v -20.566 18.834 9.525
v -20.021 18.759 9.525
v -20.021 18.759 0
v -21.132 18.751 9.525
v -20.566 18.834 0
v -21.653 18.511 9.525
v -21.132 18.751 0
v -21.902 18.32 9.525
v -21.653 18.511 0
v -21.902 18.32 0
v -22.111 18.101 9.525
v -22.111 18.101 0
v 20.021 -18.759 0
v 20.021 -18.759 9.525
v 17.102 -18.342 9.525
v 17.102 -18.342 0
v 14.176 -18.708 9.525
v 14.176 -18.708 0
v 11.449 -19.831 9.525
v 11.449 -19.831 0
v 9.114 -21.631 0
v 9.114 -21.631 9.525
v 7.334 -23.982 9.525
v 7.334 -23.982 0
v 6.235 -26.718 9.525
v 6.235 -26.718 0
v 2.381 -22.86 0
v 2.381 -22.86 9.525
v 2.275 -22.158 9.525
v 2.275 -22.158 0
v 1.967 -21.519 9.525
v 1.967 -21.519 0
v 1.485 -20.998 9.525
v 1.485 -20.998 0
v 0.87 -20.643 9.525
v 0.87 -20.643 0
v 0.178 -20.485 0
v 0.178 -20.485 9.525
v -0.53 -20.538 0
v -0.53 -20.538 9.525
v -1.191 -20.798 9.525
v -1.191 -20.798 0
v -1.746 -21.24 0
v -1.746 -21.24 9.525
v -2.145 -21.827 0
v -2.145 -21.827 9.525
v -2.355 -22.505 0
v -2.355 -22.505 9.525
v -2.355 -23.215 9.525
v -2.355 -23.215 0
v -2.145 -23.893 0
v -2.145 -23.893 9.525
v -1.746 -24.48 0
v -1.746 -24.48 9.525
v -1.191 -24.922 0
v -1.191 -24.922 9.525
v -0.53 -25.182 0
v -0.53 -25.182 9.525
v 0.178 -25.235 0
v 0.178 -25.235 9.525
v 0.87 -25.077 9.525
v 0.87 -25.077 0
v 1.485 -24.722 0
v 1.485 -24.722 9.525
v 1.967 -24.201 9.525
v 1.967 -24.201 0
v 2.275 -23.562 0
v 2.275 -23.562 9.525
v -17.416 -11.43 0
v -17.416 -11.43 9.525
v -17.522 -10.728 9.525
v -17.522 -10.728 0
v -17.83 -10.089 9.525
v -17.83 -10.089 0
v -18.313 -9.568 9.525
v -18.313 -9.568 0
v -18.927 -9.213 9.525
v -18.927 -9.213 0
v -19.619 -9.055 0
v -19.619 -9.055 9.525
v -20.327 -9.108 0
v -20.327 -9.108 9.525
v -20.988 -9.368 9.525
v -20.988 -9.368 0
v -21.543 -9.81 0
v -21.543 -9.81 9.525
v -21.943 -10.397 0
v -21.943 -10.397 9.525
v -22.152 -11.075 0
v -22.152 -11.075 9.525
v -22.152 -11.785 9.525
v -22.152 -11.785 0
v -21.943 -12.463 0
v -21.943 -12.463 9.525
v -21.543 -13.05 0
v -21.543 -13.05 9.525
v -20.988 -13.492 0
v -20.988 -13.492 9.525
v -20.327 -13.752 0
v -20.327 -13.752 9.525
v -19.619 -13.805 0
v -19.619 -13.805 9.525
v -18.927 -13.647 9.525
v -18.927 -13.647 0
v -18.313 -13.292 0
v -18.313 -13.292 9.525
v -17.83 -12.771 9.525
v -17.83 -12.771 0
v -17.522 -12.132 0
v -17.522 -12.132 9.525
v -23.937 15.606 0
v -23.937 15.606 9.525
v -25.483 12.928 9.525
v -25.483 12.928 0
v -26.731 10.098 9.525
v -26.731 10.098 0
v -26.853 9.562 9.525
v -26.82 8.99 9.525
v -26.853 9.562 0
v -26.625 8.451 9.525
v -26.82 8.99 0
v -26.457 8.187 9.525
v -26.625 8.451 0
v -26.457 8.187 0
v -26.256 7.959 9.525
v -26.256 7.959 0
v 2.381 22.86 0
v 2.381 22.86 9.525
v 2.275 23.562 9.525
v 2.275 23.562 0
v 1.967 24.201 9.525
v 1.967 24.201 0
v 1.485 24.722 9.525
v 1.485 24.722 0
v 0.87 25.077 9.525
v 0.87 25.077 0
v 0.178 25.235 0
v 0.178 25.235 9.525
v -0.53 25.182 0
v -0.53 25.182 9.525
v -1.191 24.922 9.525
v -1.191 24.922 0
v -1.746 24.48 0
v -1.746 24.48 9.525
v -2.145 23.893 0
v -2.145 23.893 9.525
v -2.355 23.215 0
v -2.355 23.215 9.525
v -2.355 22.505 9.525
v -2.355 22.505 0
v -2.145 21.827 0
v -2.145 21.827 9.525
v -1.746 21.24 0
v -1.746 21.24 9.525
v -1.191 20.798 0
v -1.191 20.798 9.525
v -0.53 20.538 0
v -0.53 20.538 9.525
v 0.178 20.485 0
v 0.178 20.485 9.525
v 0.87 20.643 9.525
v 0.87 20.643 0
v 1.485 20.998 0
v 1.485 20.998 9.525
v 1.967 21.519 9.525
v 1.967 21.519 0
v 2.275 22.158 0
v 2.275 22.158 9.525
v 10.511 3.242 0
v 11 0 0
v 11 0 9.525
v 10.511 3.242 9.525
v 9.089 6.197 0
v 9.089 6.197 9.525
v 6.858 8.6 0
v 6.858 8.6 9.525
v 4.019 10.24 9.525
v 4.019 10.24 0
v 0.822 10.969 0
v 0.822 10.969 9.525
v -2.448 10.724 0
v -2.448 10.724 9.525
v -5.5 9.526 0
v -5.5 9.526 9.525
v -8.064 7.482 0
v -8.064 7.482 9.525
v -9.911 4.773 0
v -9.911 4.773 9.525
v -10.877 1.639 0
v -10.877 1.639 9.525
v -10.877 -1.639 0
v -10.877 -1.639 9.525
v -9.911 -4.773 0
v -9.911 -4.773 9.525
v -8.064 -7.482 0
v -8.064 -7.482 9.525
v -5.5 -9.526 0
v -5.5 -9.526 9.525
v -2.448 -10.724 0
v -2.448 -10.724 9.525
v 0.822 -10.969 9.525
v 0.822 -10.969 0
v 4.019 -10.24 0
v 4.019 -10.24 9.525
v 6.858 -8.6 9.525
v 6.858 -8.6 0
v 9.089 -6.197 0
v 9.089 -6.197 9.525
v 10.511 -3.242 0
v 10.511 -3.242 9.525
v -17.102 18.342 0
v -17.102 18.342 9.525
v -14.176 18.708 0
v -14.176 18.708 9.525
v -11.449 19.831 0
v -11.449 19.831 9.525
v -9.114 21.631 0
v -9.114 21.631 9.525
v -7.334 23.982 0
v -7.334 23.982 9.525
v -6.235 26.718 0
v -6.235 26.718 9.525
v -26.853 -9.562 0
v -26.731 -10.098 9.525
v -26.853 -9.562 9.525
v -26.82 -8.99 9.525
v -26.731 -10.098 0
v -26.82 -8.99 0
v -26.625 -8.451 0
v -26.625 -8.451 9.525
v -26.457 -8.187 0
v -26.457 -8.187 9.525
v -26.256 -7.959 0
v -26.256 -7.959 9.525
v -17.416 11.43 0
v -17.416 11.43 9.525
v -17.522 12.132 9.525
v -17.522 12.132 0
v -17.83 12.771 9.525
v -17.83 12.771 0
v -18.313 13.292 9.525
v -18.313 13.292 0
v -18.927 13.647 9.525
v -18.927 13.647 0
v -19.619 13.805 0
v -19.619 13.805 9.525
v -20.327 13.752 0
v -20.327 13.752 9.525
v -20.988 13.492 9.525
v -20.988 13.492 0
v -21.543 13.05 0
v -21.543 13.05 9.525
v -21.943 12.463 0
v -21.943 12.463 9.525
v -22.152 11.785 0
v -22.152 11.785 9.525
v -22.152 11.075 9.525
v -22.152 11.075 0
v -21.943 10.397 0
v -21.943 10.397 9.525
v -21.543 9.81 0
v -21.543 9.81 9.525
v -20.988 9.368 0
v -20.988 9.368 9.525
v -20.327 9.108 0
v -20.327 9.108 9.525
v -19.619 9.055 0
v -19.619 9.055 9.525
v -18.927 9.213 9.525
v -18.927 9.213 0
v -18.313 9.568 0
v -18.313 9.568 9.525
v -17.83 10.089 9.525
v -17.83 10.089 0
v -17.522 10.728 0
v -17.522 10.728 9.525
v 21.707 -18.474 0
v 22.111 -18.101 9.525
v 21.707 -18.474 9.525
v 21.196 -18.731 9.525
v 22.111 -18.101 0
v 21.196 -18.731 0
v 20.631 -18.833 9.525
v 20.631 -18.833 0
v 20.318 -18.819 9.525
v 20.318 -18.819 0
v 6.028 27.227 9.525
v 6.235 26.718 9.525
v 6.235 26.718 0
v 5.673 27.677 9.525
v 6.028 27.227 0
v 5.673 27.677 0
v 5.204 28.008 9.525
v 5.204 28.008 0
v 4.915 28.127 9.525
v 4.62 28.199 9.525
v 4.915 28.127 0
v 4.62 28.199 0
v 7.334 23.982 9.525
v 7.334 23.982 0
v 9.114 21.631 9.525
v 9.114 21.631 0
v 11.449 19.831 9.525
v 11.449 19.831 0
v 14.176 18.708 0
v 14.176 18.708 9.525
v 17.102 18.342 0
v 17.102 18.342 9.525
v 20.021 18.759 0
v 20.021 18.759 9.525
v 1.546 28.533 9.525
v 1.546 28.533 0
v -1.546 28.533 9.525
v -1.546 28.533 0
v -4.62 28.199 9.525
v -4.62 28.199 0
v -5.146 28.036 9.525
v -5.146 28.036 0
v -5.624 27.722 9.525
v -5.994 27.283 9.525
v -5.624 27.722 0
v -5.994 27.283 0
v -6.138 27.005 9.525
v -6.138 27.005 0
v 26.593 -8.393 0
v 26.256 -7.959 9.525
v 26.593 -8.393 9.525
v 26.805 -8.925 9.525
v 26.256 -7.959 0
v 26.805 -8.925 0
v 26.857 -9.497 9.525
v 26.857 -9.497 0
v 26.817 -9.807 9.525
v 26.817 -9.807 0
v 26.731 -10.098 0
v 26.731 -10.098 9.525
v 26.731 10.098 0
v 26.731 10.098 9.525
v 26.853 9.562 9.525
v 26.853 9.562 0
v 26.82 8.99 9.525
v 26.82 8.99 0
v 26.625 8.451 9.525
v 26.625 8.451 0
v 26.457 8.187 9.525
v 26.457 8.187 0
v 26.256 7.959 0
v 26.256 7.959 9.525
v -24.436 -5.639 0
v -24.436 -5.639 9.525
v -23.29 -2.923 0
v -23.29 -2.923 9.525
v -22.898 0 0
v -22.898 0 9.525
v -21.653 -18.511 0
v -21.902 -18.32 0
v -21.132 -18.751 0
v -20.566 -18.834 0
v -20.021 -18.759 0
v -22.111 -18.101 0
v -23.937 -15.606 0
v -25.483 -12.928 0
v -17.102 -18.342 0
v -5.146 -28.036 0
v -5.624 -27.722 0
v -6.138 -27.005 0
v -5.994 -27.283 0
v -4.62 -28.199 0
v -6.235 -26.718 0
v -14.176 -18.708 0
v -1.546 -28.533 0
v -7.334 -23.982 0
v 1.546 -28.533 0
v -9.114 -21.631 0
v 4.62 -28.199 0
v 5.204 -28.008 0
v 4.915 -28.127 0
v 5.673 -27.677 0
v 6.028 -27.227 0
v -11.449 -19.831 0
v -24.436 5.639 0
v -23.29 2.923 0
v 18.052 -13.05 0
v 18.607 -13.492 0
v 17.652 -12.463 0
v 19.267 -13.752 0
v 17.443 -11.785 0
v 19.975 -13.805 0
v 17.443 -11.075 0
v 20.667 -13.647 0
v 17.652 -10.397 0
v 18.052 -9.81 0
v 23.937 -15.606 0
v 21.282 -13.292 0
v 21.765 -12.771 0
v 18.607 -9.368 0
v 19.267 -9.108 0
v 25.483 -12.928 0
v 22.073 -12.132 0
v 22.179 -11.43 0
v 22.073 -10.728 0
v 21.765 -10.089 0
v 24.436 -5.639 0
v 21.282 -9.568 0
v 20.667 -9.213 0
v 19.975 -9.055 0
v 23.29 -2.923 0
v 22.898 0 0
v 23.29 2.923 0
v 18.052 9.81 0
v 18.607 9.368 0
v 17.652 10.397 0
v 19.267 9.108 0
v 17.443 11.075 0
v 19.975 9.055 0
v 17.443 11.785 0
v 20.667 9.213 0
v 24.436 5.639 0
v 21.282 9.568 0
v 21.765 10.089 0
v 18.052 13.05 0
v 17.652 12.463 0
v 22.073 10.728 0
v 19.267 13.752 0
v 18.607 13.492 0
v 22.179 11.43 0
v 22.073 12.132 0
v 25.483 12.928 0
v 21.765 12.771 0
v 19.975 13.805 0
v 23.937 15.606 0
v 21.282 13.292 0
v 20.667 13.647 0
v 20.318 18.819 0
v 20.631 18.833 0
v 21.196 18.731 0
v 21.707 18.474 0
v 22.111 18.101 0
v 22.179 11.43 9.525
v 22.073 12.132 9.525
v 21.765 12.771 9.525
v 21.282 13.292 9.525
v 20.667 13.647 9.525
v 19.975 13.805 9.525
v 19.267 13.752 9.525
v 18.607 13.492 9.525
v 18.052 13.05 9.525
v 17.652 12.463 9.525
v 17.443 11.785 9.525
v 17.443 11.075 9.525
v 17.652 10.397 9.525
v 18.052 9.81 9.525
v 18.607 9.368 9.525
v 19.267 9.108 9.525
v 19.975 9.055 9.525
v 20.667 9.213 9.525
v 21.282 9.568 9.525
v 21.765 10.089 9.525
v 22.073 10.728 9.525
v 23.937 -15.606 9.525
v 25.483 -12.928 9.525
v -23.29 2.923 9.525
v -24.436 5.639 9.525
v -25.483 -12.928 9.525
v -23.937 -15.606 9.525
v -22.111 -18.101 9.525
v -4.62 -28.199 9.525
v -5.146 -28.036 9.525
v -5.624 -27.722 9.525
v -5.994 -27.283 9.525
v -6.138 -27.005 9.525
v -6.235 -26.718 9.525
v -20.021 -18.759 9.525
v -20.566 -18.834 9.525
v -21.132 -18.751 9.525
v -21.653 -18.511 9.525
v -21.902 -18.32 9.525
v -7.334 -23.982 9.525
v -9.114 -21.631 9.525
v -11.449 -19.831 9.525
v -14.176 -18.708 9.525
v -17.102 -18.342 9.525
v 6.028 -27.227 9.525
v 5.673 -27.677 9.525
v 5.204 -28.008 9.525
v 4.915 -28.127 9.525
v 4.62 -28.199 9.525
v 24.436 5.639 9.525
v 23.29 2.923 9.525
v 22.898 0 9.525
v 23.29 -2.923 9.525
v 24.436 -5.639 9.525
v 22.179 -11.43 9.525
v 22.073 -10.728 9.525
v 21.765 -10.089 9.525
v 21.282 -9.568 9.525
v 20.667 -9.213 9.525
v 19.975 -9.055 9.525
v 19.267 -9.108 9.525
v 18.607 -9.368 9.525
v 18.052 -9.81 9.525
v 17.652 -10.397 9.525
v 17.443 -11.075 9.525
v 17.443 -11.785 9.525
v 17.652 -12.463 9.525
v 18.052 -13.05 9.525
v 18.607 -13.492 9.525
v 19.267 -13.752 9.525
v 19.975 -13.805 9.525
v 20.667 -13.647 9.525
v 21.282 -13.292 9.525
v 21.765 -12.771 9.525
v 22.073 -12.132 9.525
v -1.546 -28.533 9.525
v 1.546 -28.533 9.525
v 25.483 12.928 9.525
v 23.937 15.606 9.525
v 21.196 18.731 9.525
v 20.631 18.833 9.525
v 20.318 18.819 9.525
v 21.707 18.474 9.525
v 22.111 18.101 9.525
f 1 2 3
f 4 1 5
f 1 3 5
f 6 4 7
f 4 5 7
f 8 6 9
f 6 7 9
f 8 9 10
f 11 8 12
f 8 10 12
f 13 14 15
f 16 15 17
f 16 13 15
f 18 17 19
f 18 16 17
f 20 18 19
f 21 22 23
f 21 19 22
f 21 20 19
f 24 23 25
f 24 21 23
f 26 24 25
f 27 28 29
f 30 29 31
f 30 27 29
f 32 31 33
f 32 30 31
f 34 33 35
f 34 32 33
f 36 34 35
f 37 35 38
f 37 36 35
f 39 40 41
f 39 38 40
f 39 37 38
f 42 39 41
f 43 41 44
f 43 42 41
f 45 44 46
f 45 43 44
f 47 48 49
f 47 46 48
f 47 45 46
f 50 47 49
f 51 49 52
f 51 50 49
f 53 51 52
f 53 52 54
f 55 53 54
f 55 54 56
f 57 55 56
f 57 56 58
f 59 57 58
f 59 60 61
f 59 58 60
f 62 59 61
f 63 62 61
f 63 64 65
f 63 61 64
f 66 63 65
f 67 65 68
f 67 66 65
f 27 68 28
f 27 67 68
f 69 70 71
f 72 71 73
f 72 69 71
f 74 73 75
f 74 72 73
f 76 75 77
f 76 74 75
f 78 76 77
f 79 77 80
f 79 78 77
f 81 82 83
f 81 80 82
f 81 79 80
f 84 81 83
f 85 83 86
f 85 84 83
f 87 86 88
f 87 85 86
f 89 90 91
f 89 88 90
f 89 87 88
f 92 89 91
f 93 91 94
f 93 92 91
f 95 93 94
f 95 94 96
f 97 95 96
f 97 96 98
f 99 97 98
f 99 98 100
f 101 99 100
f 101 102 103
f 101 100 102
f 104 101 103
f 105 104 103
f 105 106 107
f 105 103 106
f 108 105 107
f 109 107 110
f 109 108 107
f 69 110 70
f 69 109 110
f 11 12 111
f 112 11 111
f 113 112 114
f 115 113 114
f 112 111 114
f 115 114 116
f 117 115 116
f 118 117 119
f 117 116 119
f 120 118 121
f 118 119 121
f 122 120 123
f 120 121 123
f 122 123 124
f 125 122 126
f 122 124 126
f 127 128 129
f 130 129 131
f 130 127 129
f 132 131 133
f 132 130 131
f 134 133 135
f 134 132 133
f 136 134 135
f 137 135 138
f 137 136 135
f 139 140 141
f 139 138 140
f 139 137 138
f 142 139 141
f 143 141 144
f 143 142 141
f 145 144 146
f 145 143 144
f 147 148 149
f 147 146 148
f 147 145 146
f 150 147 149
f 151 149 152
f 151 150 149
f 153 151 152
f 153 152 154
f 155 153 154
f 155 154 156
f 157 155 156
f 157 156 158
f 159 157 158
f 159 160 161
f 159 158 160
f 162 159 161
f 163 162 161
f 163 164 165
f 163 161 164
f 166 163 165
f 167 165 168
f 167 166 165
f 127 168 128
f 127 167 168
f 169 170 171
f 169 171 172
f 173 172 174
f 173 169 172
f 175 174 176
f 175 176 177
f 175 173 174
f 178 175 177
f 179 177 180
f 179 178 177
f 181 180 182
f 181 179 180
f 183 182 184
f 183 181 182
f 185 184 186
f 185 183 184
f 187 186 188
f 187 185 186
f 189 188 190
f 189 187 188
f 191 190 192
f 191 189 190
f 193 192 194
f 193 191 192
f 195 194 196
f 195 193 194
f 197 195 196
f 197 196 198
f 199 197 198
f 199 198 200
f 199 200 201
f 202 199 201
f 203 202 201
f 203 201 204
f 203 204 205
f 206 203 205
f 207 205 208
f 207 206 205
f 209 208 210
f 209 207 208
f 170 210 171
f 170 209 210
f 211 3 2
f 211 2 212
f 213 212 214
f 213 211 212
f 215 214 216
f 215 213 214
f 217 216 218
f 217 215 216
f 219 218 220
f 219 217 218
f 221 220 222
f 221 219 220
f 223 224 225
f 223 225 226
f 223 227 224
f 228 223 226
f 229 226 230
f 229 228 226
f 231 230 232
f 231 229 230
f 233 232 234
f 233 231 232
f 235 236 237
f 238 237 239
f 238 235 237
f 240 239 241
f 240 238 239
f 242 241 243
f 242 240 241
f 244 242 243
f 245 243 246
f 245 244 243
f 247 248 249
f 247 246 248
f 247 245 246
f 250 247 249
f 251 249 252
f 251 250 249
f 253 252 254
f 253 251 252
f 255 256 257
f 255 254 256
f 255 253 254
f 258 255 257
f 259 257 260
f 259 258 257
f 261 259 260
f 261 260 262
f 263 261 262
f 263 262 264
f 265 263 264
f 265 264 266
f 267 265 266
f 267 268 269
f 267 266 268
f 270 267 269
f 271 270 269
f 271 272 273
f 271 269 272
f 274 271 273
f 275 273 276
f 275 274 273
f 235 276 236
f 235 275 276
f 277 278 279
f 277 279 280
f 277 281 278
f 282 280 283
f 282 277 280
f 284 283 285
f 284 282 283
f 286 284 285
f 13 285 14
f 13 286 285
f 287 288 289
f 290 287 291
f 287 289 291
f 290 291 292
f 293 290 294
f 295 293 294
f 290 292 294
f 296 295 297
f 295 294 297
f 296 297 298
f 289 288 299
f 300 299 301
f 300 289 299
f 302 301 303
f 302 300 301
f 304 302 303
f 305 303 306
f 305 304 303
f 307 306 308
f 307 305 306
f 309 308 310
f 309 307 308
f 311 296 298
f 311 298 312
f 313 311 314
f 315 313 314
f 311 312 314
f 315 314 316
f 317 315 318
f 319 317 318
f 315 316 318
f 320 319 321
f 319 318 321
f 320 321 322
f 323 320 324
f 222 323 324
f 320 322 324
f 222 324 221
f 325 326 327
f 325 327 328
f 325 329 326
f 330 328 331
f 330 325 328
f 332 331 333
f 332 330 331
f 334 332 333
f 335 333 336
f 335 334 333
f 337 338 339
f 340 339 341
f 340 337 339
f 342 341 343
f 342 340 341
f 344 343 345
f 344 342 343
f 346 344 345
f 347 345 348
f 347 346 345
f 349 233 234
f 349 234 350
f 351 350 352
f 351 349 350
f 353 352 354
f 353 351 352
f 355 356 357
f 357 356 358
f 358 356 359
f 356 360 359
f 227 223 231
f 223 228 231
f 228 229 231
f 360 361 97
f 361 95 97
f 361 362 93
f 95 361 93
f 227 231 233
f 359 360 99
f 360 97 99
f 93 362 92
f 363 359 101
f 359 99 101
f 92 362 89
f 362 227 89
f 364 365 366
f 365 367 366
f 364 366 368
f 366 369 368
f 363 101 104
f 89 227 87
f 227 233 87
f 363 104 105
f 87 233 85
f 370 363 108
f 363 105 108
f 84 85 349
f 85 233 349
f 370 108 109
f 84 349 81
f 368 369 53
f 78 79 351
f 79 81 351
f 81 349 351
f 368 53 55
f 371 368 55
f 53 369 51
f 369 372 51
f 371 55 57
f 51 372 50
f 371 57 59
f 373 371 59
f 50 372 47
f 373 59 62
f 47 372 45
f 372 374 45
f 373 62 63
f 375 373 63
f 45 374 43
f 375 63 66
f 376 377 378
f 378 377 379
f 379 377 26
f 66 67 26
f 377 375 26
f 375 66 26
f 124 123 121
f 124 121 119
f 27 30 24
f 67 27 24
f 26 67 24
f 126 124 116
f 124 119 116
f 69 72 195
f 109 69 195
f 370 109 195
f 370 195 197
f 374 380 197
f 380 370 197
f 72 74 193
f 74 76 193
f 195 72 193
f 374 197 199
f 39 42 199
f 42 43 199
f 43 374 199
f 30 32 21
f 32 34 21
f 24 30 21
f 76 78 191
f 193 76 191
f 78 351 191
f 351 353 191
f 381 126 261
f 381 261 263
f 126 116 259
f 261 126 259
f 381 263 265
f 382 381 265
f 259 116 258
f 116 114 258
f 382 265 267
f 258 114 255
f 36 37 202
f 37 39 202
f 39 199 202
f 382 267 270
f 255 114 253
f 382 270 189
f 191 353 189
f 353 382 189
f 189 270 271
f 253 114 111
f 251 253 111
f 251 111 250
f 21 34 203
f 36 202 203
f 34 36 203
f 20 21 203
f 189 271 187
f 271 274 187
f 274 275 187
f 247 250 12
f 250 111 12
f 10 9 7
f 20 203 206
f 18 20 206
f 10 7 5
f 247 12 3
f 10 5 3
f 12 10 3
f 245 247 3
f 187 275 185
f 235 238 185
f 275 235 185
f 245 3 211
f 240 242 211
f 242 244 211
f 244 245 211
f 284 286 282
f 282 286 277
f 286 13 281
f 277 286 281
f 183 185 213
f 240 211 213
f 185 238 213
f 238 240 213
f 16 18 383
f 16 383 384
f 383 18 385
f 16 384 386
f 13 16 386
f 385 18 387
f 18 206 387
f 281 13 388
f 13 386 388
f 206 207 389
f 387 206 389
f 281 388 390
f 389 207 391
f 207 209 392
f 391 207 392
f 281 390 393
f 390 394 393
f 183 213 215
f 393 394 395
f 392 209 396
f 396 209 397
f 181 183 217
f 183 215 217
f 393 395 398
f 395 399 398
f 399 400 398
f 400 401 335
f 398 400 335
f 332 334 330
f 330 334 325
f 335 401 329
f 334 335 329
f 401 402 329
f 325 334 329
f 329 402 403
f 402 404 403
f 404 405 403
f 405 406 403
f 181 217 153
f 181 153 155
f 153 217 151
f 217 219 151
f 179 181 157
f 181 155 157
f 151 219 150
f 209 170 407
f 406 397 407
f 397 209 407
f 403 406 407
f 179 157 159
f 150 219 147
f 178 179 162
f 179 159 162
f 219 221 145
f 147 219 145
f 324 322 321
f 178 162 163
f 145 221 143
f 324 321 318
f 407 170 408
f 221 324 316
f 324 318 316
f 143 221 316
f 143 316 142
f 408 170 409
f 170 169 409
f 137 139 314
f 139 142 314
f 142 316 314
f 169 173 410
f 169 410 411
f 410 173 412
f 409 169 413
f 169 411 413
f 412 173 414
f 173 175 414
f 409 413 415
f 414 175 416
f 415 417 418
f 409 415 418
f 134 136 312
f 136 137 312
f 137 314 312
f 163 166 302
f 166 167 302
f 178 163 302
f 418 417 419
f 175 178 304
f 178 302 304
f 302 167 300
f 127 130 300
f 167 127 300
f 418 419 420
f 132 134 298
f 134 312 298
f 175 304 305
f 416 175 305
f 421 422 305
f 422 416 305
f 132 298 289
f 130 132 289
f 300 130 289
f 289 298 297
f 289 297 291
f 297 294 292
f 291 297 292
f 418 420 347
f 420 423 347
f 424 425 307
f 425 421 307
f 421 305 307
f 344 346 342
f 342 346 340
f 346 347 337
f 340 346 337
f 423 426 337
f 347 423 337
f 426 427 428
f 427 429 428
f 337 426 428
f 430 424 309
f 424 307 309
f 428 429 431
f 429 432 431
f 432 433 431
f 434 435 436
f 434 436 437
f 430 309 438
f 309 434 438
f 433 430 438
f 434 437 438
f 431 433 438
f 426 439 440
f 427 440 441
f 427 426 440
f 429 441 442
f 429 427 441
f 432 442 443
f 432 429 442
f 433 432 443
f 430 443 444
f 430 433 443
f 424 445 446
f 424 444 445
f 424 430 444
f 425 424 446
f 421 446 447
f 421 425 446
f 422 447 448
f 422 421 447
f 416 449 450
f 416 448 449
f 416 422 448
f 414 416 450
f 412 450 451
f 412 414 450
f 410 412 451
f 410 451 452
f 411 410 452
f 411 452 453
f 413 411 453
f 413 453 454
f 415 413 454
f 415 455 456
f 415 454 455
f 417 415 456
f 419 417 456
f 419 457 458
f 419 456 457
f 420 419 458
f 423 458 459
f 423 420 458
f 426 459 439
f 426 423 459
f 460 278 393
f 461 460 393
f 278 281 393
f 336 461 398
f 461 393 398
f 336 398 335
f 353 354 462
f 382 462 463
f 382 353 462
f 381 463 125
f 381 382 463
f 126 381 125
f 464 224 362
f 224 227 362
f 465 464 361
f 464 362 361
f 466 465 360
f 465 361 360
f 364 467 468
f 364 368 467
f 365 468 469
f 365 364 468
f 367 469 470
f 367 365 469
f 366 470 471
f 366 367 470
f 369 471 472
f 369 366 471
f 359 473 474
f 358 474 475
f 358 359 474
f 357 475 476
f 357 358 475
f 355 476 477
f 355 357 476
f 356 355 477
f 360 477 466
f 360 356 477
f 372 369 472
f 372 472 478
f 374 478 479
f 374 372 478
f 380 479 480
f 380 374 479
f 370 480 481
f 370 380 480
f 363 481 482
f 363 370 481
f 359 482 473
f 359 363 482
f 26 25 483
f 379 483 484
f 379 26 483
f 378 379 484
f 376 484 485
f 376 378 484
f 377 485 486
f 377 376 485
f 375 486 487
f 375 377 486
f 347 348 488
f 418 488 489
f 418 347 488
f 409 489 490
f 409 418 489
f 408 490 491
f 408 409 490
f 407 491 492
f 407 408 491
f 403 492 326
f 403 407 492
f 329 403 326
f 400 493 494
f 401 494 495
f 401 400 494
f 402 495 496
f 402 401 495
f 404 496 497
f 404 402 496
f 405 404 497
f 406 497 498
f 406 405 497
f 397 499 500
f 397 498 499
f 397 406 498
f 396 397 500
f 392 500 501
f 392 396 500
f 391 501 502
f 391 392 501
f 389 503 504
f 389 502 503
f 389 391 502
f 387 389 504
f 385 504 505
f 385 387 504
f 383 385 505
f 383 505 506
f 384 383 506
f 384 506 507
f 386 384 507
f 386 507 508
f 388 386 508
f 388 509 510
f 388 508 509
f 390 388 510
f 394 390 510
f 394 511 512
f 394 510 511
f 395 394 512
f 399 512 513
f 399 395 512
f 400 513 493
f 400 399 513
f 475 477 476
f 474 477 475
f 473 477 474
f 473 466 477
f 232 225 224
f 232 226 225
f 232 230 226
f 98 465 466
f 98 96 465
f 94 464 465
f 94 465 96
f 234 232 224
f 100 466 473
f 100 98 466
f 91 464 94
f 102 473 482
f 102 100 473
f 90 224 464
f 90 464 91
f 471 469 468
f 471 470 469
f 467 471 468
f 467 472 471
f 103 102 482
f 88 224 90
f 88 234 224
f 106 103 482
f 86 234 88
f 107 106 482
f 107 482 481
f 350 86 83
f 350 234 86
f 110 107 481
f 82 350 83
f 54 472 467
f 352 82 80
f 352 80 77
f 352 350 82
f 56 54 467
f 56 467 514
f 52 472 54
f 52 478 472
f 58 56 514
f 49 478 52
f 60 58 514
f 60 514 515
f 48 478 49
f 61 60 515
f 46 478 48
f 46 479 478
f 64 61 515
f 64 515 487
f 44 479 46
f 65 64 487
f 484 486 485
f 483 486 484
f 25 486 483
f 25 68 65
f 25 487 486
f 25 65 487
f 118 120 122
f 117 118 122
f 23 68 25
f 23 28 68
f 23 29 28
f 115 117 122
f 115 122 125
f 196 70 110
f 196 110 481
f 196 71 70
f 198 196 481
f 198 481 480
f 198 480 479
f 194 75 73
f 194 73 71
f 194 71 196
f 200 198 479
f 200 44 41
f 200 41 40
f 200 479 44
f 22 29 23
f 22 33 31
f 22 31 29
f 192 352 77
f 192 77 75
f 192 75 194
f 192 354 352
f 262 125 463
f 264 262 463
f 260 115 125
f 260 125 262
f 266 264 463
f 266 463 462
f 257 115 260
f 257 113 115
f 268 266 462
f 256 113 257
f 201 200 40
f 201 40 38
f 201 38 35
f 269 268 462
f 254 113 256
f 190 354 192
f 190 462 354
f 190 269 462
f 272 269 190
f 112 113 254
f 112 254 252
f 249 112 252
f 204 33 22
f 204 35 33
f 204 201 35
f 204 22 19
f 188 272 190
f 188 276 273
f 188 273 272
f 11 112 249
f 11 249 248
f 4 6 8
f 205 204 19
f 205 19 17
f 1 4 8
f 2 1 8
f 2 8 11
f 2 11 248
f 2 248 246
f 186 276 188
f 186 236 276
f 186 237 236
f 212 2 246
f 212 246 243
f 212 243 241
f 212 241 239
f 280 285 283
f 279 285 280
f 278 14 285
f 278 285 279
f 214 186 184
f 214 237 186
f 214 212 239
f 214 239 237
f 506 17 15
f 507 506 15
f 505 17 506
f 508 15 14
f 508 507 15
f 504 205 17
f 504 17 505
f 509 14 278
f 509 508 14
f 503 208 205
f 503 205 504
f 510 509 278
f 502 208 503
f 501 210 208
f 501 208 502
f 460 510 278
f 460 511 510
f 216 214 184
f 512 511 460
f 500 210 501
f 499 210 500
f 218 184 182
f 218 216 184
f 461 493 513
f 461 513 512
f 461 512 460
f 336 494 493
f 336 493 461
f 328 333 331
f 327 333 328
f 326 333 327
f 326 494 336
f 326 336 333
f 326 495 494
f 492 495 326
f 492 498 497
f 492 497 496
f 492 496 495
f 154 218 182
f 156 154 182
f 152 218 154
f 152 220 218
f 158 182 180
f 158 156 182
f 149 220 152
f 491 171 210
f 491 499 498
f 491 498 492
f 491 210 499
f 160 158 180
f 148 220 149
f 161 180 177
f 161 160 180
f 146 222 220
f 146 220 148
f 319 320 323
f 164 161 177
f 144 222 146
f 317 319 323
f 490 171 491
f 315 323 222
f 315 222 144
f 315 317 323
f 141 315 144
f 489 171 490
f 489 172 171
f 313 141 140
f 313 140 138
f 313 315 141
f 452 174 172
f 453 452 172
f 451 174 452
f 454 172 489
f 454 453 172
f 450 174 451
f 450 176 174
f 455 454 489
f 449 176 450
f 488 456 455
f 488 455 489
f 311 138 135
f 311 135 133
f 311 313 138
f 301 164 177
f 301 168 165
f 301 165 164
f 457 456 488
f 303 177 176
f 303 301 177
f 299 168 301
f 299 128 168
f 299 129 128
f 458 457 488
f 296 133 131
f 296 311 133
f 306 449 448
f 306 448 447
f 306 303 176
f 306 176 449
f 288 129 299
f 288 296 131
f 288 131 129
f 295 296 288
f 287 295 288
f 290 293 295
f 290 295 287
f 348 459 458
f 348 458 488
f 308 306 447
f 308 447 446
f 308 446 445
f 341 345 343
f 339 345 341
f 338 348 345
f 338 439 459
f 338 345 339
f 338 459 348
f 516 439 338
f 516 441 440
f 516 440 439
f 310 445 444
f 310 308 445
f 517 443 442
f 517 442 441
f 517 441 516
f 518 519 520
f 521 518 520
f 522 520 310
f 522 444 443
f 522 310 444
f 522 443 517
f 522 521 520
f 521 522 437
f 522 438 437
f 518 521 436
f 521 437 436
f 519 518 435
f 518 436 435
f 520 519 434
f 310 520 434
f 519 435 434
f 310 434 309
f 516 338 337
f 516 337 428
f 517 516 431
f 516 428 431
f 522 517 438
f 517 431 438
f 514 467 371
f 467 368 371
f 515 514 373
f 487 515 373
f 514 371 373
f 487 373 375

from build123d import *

# Parameters (mm, degrees)
F0_R     = 28.575
F0_R_2   = 11
F1_DEPTH = 9.525
F3_DEPTH = 25.4
F4_R     = 2.38125
F5_DEPTH = 25.4
F6_R     = 2


with BuildPart() as f1:
    # F0 (on Top) → F1 (new body)
    with BuildSketch(Plane.XY):
        Circle(F0_R)
        Circle(F0_R_2, mode=Mode.SUBTRACT)
    extrude(amount=F1_DEPTH)

    # F2 (on Top) → F3 (cut)
    with BuildSketch(Plane.XY):
        with BuildLine():
            ThreePointArc((6.6033751745, -33.3637991738), (17.0054966041, -29.4543841262), (25.592210064, -22.4005902387))
            ThreePointArc((25.592210064, -22.4005902387), (11.4492466041, -19.8306768266), (6.6033751745, -33.3637991738))
        make_face()
        with BuildLine():
            ThreePointArc((-25.592210064, -22.4005902387), (-17.0054966041, -29.4543841262), (-6.6033751745, -33.3637991738))
            ThreePointArc((-6.6033751745, -33.3637991738), (-6.0720335059, -31.4411002438), (-5.8929966041, -29.4543841262))
            ThreePointArc((-5.8929966041, -29.4543841262), (-13.259311683, -18.9923692731), (-25.592210064, -22.4005902387))
        make_face()
        with BuildLine():
            ThreePointArc((-22.8984932081, 0), (-25.5356944726, 7.187278177), (-32.1955852385, 10.9632089351))
            ThreePointArc((-32.1955852385, 10.9632089351), (-34.0109932081, 0), (-32.1955852385, -10.9632089351))
            ThreePointArc((-32.1955852385, -10.9632089351), (-25.5356944726, -7.187278177), (-22.8984932081, 0))
        make_face()
        with BuildLine():
            ThreePointArc((-5.8929966041, 29.4543841262), (-6.0720335059, 31.4411002438), (-6.6033751745, 33.3637991738))
            ThreePointArc((-6.6033751745, 33.3637991738), (-17.0054966041, 29.4543841262), (-25.592210064, 22.4005902387))
            ThreePointArc((-25.592210064, 22.4005902387), (-13.259311683, 18.9923692731), (-5.8929966041, 29.4543841262))
        make_face()
        with BuildLine():
            ThreePointArc((6.6033751745, 33.3637991738), (11.4492466041, 19.8306768266), (25.592210064, 22.4005902387))
            ThreePointArc((25.592210064, 22.4005902387), (17.0054966041, 29.4543841262), (6.6033751745, 33.3637991738))
        make_face()
        with BuildLine():
            ThreePointArc((32.1955852385, -10.9632089351), (33.5540719577, -5.55625), (34.0109932081, 0))
            ThreePointArc((34.0109932081, 0), (33.5540719577, 5.55625), (32.1955852385, 10.9632089351))
            ThreePointArc((32.1955852385, 10.9632089351), (22.8984932081, 0), (32.1955852385, -10.9632089351))
        make_face()
    extrude(amount=F3_DEPTH, mode=Mode.SUBTRACT)

    # F4 (on Top) → F5 (cut)
    with BuildSketch(Plane.XY):
        with Locations((0, 22.86)):
            Circle(F4_R)
        with Locations((-19.7973407305, 11.43)):
            Circle(F4_R)
        with Locations((-19.7973407305, -11.43)):
            Circle(F4_R)
        with Locations((0, -22.86)):
            Circle(F4_R)
        with Locations((19.7973407305, -11.43)):
            Circle(F4_R)
        with Locations((19.7973407305, 11.43)):
            Circle(F4_R)
    extrude(amount=F5_DEPTH, mode=Mode.SUBTRACT)

    # F6
    f6_edges = [f1.edges().sort_by_distance(p)[0] for p in [
        (-5.996854, -27.938654, 4.7625),
        (-21.197157, -19.162755, 4.7625),
        (-27.194011, -8.775899, 4.7625),
        (-27.194011, 8.775899, 4.7625),
        (-21.197157, 19.162755, 4.7625),
        (-5.996854, 27.938654, 4.7625),
        (21.197157, 19.162755, 4.7625),
        (5.996854, 27.938654, 4.7625),
        (27.194011, 8.775899, 4.7625),
        (27.194011, -8.775899, 4.7625),
        (21.197157, -19.162755, 4.7625),
        (5.996854, -27.938654, 4.7625),
    ]]
    fillet(f6_edges, radius=F6_R)


solid = f1.part
